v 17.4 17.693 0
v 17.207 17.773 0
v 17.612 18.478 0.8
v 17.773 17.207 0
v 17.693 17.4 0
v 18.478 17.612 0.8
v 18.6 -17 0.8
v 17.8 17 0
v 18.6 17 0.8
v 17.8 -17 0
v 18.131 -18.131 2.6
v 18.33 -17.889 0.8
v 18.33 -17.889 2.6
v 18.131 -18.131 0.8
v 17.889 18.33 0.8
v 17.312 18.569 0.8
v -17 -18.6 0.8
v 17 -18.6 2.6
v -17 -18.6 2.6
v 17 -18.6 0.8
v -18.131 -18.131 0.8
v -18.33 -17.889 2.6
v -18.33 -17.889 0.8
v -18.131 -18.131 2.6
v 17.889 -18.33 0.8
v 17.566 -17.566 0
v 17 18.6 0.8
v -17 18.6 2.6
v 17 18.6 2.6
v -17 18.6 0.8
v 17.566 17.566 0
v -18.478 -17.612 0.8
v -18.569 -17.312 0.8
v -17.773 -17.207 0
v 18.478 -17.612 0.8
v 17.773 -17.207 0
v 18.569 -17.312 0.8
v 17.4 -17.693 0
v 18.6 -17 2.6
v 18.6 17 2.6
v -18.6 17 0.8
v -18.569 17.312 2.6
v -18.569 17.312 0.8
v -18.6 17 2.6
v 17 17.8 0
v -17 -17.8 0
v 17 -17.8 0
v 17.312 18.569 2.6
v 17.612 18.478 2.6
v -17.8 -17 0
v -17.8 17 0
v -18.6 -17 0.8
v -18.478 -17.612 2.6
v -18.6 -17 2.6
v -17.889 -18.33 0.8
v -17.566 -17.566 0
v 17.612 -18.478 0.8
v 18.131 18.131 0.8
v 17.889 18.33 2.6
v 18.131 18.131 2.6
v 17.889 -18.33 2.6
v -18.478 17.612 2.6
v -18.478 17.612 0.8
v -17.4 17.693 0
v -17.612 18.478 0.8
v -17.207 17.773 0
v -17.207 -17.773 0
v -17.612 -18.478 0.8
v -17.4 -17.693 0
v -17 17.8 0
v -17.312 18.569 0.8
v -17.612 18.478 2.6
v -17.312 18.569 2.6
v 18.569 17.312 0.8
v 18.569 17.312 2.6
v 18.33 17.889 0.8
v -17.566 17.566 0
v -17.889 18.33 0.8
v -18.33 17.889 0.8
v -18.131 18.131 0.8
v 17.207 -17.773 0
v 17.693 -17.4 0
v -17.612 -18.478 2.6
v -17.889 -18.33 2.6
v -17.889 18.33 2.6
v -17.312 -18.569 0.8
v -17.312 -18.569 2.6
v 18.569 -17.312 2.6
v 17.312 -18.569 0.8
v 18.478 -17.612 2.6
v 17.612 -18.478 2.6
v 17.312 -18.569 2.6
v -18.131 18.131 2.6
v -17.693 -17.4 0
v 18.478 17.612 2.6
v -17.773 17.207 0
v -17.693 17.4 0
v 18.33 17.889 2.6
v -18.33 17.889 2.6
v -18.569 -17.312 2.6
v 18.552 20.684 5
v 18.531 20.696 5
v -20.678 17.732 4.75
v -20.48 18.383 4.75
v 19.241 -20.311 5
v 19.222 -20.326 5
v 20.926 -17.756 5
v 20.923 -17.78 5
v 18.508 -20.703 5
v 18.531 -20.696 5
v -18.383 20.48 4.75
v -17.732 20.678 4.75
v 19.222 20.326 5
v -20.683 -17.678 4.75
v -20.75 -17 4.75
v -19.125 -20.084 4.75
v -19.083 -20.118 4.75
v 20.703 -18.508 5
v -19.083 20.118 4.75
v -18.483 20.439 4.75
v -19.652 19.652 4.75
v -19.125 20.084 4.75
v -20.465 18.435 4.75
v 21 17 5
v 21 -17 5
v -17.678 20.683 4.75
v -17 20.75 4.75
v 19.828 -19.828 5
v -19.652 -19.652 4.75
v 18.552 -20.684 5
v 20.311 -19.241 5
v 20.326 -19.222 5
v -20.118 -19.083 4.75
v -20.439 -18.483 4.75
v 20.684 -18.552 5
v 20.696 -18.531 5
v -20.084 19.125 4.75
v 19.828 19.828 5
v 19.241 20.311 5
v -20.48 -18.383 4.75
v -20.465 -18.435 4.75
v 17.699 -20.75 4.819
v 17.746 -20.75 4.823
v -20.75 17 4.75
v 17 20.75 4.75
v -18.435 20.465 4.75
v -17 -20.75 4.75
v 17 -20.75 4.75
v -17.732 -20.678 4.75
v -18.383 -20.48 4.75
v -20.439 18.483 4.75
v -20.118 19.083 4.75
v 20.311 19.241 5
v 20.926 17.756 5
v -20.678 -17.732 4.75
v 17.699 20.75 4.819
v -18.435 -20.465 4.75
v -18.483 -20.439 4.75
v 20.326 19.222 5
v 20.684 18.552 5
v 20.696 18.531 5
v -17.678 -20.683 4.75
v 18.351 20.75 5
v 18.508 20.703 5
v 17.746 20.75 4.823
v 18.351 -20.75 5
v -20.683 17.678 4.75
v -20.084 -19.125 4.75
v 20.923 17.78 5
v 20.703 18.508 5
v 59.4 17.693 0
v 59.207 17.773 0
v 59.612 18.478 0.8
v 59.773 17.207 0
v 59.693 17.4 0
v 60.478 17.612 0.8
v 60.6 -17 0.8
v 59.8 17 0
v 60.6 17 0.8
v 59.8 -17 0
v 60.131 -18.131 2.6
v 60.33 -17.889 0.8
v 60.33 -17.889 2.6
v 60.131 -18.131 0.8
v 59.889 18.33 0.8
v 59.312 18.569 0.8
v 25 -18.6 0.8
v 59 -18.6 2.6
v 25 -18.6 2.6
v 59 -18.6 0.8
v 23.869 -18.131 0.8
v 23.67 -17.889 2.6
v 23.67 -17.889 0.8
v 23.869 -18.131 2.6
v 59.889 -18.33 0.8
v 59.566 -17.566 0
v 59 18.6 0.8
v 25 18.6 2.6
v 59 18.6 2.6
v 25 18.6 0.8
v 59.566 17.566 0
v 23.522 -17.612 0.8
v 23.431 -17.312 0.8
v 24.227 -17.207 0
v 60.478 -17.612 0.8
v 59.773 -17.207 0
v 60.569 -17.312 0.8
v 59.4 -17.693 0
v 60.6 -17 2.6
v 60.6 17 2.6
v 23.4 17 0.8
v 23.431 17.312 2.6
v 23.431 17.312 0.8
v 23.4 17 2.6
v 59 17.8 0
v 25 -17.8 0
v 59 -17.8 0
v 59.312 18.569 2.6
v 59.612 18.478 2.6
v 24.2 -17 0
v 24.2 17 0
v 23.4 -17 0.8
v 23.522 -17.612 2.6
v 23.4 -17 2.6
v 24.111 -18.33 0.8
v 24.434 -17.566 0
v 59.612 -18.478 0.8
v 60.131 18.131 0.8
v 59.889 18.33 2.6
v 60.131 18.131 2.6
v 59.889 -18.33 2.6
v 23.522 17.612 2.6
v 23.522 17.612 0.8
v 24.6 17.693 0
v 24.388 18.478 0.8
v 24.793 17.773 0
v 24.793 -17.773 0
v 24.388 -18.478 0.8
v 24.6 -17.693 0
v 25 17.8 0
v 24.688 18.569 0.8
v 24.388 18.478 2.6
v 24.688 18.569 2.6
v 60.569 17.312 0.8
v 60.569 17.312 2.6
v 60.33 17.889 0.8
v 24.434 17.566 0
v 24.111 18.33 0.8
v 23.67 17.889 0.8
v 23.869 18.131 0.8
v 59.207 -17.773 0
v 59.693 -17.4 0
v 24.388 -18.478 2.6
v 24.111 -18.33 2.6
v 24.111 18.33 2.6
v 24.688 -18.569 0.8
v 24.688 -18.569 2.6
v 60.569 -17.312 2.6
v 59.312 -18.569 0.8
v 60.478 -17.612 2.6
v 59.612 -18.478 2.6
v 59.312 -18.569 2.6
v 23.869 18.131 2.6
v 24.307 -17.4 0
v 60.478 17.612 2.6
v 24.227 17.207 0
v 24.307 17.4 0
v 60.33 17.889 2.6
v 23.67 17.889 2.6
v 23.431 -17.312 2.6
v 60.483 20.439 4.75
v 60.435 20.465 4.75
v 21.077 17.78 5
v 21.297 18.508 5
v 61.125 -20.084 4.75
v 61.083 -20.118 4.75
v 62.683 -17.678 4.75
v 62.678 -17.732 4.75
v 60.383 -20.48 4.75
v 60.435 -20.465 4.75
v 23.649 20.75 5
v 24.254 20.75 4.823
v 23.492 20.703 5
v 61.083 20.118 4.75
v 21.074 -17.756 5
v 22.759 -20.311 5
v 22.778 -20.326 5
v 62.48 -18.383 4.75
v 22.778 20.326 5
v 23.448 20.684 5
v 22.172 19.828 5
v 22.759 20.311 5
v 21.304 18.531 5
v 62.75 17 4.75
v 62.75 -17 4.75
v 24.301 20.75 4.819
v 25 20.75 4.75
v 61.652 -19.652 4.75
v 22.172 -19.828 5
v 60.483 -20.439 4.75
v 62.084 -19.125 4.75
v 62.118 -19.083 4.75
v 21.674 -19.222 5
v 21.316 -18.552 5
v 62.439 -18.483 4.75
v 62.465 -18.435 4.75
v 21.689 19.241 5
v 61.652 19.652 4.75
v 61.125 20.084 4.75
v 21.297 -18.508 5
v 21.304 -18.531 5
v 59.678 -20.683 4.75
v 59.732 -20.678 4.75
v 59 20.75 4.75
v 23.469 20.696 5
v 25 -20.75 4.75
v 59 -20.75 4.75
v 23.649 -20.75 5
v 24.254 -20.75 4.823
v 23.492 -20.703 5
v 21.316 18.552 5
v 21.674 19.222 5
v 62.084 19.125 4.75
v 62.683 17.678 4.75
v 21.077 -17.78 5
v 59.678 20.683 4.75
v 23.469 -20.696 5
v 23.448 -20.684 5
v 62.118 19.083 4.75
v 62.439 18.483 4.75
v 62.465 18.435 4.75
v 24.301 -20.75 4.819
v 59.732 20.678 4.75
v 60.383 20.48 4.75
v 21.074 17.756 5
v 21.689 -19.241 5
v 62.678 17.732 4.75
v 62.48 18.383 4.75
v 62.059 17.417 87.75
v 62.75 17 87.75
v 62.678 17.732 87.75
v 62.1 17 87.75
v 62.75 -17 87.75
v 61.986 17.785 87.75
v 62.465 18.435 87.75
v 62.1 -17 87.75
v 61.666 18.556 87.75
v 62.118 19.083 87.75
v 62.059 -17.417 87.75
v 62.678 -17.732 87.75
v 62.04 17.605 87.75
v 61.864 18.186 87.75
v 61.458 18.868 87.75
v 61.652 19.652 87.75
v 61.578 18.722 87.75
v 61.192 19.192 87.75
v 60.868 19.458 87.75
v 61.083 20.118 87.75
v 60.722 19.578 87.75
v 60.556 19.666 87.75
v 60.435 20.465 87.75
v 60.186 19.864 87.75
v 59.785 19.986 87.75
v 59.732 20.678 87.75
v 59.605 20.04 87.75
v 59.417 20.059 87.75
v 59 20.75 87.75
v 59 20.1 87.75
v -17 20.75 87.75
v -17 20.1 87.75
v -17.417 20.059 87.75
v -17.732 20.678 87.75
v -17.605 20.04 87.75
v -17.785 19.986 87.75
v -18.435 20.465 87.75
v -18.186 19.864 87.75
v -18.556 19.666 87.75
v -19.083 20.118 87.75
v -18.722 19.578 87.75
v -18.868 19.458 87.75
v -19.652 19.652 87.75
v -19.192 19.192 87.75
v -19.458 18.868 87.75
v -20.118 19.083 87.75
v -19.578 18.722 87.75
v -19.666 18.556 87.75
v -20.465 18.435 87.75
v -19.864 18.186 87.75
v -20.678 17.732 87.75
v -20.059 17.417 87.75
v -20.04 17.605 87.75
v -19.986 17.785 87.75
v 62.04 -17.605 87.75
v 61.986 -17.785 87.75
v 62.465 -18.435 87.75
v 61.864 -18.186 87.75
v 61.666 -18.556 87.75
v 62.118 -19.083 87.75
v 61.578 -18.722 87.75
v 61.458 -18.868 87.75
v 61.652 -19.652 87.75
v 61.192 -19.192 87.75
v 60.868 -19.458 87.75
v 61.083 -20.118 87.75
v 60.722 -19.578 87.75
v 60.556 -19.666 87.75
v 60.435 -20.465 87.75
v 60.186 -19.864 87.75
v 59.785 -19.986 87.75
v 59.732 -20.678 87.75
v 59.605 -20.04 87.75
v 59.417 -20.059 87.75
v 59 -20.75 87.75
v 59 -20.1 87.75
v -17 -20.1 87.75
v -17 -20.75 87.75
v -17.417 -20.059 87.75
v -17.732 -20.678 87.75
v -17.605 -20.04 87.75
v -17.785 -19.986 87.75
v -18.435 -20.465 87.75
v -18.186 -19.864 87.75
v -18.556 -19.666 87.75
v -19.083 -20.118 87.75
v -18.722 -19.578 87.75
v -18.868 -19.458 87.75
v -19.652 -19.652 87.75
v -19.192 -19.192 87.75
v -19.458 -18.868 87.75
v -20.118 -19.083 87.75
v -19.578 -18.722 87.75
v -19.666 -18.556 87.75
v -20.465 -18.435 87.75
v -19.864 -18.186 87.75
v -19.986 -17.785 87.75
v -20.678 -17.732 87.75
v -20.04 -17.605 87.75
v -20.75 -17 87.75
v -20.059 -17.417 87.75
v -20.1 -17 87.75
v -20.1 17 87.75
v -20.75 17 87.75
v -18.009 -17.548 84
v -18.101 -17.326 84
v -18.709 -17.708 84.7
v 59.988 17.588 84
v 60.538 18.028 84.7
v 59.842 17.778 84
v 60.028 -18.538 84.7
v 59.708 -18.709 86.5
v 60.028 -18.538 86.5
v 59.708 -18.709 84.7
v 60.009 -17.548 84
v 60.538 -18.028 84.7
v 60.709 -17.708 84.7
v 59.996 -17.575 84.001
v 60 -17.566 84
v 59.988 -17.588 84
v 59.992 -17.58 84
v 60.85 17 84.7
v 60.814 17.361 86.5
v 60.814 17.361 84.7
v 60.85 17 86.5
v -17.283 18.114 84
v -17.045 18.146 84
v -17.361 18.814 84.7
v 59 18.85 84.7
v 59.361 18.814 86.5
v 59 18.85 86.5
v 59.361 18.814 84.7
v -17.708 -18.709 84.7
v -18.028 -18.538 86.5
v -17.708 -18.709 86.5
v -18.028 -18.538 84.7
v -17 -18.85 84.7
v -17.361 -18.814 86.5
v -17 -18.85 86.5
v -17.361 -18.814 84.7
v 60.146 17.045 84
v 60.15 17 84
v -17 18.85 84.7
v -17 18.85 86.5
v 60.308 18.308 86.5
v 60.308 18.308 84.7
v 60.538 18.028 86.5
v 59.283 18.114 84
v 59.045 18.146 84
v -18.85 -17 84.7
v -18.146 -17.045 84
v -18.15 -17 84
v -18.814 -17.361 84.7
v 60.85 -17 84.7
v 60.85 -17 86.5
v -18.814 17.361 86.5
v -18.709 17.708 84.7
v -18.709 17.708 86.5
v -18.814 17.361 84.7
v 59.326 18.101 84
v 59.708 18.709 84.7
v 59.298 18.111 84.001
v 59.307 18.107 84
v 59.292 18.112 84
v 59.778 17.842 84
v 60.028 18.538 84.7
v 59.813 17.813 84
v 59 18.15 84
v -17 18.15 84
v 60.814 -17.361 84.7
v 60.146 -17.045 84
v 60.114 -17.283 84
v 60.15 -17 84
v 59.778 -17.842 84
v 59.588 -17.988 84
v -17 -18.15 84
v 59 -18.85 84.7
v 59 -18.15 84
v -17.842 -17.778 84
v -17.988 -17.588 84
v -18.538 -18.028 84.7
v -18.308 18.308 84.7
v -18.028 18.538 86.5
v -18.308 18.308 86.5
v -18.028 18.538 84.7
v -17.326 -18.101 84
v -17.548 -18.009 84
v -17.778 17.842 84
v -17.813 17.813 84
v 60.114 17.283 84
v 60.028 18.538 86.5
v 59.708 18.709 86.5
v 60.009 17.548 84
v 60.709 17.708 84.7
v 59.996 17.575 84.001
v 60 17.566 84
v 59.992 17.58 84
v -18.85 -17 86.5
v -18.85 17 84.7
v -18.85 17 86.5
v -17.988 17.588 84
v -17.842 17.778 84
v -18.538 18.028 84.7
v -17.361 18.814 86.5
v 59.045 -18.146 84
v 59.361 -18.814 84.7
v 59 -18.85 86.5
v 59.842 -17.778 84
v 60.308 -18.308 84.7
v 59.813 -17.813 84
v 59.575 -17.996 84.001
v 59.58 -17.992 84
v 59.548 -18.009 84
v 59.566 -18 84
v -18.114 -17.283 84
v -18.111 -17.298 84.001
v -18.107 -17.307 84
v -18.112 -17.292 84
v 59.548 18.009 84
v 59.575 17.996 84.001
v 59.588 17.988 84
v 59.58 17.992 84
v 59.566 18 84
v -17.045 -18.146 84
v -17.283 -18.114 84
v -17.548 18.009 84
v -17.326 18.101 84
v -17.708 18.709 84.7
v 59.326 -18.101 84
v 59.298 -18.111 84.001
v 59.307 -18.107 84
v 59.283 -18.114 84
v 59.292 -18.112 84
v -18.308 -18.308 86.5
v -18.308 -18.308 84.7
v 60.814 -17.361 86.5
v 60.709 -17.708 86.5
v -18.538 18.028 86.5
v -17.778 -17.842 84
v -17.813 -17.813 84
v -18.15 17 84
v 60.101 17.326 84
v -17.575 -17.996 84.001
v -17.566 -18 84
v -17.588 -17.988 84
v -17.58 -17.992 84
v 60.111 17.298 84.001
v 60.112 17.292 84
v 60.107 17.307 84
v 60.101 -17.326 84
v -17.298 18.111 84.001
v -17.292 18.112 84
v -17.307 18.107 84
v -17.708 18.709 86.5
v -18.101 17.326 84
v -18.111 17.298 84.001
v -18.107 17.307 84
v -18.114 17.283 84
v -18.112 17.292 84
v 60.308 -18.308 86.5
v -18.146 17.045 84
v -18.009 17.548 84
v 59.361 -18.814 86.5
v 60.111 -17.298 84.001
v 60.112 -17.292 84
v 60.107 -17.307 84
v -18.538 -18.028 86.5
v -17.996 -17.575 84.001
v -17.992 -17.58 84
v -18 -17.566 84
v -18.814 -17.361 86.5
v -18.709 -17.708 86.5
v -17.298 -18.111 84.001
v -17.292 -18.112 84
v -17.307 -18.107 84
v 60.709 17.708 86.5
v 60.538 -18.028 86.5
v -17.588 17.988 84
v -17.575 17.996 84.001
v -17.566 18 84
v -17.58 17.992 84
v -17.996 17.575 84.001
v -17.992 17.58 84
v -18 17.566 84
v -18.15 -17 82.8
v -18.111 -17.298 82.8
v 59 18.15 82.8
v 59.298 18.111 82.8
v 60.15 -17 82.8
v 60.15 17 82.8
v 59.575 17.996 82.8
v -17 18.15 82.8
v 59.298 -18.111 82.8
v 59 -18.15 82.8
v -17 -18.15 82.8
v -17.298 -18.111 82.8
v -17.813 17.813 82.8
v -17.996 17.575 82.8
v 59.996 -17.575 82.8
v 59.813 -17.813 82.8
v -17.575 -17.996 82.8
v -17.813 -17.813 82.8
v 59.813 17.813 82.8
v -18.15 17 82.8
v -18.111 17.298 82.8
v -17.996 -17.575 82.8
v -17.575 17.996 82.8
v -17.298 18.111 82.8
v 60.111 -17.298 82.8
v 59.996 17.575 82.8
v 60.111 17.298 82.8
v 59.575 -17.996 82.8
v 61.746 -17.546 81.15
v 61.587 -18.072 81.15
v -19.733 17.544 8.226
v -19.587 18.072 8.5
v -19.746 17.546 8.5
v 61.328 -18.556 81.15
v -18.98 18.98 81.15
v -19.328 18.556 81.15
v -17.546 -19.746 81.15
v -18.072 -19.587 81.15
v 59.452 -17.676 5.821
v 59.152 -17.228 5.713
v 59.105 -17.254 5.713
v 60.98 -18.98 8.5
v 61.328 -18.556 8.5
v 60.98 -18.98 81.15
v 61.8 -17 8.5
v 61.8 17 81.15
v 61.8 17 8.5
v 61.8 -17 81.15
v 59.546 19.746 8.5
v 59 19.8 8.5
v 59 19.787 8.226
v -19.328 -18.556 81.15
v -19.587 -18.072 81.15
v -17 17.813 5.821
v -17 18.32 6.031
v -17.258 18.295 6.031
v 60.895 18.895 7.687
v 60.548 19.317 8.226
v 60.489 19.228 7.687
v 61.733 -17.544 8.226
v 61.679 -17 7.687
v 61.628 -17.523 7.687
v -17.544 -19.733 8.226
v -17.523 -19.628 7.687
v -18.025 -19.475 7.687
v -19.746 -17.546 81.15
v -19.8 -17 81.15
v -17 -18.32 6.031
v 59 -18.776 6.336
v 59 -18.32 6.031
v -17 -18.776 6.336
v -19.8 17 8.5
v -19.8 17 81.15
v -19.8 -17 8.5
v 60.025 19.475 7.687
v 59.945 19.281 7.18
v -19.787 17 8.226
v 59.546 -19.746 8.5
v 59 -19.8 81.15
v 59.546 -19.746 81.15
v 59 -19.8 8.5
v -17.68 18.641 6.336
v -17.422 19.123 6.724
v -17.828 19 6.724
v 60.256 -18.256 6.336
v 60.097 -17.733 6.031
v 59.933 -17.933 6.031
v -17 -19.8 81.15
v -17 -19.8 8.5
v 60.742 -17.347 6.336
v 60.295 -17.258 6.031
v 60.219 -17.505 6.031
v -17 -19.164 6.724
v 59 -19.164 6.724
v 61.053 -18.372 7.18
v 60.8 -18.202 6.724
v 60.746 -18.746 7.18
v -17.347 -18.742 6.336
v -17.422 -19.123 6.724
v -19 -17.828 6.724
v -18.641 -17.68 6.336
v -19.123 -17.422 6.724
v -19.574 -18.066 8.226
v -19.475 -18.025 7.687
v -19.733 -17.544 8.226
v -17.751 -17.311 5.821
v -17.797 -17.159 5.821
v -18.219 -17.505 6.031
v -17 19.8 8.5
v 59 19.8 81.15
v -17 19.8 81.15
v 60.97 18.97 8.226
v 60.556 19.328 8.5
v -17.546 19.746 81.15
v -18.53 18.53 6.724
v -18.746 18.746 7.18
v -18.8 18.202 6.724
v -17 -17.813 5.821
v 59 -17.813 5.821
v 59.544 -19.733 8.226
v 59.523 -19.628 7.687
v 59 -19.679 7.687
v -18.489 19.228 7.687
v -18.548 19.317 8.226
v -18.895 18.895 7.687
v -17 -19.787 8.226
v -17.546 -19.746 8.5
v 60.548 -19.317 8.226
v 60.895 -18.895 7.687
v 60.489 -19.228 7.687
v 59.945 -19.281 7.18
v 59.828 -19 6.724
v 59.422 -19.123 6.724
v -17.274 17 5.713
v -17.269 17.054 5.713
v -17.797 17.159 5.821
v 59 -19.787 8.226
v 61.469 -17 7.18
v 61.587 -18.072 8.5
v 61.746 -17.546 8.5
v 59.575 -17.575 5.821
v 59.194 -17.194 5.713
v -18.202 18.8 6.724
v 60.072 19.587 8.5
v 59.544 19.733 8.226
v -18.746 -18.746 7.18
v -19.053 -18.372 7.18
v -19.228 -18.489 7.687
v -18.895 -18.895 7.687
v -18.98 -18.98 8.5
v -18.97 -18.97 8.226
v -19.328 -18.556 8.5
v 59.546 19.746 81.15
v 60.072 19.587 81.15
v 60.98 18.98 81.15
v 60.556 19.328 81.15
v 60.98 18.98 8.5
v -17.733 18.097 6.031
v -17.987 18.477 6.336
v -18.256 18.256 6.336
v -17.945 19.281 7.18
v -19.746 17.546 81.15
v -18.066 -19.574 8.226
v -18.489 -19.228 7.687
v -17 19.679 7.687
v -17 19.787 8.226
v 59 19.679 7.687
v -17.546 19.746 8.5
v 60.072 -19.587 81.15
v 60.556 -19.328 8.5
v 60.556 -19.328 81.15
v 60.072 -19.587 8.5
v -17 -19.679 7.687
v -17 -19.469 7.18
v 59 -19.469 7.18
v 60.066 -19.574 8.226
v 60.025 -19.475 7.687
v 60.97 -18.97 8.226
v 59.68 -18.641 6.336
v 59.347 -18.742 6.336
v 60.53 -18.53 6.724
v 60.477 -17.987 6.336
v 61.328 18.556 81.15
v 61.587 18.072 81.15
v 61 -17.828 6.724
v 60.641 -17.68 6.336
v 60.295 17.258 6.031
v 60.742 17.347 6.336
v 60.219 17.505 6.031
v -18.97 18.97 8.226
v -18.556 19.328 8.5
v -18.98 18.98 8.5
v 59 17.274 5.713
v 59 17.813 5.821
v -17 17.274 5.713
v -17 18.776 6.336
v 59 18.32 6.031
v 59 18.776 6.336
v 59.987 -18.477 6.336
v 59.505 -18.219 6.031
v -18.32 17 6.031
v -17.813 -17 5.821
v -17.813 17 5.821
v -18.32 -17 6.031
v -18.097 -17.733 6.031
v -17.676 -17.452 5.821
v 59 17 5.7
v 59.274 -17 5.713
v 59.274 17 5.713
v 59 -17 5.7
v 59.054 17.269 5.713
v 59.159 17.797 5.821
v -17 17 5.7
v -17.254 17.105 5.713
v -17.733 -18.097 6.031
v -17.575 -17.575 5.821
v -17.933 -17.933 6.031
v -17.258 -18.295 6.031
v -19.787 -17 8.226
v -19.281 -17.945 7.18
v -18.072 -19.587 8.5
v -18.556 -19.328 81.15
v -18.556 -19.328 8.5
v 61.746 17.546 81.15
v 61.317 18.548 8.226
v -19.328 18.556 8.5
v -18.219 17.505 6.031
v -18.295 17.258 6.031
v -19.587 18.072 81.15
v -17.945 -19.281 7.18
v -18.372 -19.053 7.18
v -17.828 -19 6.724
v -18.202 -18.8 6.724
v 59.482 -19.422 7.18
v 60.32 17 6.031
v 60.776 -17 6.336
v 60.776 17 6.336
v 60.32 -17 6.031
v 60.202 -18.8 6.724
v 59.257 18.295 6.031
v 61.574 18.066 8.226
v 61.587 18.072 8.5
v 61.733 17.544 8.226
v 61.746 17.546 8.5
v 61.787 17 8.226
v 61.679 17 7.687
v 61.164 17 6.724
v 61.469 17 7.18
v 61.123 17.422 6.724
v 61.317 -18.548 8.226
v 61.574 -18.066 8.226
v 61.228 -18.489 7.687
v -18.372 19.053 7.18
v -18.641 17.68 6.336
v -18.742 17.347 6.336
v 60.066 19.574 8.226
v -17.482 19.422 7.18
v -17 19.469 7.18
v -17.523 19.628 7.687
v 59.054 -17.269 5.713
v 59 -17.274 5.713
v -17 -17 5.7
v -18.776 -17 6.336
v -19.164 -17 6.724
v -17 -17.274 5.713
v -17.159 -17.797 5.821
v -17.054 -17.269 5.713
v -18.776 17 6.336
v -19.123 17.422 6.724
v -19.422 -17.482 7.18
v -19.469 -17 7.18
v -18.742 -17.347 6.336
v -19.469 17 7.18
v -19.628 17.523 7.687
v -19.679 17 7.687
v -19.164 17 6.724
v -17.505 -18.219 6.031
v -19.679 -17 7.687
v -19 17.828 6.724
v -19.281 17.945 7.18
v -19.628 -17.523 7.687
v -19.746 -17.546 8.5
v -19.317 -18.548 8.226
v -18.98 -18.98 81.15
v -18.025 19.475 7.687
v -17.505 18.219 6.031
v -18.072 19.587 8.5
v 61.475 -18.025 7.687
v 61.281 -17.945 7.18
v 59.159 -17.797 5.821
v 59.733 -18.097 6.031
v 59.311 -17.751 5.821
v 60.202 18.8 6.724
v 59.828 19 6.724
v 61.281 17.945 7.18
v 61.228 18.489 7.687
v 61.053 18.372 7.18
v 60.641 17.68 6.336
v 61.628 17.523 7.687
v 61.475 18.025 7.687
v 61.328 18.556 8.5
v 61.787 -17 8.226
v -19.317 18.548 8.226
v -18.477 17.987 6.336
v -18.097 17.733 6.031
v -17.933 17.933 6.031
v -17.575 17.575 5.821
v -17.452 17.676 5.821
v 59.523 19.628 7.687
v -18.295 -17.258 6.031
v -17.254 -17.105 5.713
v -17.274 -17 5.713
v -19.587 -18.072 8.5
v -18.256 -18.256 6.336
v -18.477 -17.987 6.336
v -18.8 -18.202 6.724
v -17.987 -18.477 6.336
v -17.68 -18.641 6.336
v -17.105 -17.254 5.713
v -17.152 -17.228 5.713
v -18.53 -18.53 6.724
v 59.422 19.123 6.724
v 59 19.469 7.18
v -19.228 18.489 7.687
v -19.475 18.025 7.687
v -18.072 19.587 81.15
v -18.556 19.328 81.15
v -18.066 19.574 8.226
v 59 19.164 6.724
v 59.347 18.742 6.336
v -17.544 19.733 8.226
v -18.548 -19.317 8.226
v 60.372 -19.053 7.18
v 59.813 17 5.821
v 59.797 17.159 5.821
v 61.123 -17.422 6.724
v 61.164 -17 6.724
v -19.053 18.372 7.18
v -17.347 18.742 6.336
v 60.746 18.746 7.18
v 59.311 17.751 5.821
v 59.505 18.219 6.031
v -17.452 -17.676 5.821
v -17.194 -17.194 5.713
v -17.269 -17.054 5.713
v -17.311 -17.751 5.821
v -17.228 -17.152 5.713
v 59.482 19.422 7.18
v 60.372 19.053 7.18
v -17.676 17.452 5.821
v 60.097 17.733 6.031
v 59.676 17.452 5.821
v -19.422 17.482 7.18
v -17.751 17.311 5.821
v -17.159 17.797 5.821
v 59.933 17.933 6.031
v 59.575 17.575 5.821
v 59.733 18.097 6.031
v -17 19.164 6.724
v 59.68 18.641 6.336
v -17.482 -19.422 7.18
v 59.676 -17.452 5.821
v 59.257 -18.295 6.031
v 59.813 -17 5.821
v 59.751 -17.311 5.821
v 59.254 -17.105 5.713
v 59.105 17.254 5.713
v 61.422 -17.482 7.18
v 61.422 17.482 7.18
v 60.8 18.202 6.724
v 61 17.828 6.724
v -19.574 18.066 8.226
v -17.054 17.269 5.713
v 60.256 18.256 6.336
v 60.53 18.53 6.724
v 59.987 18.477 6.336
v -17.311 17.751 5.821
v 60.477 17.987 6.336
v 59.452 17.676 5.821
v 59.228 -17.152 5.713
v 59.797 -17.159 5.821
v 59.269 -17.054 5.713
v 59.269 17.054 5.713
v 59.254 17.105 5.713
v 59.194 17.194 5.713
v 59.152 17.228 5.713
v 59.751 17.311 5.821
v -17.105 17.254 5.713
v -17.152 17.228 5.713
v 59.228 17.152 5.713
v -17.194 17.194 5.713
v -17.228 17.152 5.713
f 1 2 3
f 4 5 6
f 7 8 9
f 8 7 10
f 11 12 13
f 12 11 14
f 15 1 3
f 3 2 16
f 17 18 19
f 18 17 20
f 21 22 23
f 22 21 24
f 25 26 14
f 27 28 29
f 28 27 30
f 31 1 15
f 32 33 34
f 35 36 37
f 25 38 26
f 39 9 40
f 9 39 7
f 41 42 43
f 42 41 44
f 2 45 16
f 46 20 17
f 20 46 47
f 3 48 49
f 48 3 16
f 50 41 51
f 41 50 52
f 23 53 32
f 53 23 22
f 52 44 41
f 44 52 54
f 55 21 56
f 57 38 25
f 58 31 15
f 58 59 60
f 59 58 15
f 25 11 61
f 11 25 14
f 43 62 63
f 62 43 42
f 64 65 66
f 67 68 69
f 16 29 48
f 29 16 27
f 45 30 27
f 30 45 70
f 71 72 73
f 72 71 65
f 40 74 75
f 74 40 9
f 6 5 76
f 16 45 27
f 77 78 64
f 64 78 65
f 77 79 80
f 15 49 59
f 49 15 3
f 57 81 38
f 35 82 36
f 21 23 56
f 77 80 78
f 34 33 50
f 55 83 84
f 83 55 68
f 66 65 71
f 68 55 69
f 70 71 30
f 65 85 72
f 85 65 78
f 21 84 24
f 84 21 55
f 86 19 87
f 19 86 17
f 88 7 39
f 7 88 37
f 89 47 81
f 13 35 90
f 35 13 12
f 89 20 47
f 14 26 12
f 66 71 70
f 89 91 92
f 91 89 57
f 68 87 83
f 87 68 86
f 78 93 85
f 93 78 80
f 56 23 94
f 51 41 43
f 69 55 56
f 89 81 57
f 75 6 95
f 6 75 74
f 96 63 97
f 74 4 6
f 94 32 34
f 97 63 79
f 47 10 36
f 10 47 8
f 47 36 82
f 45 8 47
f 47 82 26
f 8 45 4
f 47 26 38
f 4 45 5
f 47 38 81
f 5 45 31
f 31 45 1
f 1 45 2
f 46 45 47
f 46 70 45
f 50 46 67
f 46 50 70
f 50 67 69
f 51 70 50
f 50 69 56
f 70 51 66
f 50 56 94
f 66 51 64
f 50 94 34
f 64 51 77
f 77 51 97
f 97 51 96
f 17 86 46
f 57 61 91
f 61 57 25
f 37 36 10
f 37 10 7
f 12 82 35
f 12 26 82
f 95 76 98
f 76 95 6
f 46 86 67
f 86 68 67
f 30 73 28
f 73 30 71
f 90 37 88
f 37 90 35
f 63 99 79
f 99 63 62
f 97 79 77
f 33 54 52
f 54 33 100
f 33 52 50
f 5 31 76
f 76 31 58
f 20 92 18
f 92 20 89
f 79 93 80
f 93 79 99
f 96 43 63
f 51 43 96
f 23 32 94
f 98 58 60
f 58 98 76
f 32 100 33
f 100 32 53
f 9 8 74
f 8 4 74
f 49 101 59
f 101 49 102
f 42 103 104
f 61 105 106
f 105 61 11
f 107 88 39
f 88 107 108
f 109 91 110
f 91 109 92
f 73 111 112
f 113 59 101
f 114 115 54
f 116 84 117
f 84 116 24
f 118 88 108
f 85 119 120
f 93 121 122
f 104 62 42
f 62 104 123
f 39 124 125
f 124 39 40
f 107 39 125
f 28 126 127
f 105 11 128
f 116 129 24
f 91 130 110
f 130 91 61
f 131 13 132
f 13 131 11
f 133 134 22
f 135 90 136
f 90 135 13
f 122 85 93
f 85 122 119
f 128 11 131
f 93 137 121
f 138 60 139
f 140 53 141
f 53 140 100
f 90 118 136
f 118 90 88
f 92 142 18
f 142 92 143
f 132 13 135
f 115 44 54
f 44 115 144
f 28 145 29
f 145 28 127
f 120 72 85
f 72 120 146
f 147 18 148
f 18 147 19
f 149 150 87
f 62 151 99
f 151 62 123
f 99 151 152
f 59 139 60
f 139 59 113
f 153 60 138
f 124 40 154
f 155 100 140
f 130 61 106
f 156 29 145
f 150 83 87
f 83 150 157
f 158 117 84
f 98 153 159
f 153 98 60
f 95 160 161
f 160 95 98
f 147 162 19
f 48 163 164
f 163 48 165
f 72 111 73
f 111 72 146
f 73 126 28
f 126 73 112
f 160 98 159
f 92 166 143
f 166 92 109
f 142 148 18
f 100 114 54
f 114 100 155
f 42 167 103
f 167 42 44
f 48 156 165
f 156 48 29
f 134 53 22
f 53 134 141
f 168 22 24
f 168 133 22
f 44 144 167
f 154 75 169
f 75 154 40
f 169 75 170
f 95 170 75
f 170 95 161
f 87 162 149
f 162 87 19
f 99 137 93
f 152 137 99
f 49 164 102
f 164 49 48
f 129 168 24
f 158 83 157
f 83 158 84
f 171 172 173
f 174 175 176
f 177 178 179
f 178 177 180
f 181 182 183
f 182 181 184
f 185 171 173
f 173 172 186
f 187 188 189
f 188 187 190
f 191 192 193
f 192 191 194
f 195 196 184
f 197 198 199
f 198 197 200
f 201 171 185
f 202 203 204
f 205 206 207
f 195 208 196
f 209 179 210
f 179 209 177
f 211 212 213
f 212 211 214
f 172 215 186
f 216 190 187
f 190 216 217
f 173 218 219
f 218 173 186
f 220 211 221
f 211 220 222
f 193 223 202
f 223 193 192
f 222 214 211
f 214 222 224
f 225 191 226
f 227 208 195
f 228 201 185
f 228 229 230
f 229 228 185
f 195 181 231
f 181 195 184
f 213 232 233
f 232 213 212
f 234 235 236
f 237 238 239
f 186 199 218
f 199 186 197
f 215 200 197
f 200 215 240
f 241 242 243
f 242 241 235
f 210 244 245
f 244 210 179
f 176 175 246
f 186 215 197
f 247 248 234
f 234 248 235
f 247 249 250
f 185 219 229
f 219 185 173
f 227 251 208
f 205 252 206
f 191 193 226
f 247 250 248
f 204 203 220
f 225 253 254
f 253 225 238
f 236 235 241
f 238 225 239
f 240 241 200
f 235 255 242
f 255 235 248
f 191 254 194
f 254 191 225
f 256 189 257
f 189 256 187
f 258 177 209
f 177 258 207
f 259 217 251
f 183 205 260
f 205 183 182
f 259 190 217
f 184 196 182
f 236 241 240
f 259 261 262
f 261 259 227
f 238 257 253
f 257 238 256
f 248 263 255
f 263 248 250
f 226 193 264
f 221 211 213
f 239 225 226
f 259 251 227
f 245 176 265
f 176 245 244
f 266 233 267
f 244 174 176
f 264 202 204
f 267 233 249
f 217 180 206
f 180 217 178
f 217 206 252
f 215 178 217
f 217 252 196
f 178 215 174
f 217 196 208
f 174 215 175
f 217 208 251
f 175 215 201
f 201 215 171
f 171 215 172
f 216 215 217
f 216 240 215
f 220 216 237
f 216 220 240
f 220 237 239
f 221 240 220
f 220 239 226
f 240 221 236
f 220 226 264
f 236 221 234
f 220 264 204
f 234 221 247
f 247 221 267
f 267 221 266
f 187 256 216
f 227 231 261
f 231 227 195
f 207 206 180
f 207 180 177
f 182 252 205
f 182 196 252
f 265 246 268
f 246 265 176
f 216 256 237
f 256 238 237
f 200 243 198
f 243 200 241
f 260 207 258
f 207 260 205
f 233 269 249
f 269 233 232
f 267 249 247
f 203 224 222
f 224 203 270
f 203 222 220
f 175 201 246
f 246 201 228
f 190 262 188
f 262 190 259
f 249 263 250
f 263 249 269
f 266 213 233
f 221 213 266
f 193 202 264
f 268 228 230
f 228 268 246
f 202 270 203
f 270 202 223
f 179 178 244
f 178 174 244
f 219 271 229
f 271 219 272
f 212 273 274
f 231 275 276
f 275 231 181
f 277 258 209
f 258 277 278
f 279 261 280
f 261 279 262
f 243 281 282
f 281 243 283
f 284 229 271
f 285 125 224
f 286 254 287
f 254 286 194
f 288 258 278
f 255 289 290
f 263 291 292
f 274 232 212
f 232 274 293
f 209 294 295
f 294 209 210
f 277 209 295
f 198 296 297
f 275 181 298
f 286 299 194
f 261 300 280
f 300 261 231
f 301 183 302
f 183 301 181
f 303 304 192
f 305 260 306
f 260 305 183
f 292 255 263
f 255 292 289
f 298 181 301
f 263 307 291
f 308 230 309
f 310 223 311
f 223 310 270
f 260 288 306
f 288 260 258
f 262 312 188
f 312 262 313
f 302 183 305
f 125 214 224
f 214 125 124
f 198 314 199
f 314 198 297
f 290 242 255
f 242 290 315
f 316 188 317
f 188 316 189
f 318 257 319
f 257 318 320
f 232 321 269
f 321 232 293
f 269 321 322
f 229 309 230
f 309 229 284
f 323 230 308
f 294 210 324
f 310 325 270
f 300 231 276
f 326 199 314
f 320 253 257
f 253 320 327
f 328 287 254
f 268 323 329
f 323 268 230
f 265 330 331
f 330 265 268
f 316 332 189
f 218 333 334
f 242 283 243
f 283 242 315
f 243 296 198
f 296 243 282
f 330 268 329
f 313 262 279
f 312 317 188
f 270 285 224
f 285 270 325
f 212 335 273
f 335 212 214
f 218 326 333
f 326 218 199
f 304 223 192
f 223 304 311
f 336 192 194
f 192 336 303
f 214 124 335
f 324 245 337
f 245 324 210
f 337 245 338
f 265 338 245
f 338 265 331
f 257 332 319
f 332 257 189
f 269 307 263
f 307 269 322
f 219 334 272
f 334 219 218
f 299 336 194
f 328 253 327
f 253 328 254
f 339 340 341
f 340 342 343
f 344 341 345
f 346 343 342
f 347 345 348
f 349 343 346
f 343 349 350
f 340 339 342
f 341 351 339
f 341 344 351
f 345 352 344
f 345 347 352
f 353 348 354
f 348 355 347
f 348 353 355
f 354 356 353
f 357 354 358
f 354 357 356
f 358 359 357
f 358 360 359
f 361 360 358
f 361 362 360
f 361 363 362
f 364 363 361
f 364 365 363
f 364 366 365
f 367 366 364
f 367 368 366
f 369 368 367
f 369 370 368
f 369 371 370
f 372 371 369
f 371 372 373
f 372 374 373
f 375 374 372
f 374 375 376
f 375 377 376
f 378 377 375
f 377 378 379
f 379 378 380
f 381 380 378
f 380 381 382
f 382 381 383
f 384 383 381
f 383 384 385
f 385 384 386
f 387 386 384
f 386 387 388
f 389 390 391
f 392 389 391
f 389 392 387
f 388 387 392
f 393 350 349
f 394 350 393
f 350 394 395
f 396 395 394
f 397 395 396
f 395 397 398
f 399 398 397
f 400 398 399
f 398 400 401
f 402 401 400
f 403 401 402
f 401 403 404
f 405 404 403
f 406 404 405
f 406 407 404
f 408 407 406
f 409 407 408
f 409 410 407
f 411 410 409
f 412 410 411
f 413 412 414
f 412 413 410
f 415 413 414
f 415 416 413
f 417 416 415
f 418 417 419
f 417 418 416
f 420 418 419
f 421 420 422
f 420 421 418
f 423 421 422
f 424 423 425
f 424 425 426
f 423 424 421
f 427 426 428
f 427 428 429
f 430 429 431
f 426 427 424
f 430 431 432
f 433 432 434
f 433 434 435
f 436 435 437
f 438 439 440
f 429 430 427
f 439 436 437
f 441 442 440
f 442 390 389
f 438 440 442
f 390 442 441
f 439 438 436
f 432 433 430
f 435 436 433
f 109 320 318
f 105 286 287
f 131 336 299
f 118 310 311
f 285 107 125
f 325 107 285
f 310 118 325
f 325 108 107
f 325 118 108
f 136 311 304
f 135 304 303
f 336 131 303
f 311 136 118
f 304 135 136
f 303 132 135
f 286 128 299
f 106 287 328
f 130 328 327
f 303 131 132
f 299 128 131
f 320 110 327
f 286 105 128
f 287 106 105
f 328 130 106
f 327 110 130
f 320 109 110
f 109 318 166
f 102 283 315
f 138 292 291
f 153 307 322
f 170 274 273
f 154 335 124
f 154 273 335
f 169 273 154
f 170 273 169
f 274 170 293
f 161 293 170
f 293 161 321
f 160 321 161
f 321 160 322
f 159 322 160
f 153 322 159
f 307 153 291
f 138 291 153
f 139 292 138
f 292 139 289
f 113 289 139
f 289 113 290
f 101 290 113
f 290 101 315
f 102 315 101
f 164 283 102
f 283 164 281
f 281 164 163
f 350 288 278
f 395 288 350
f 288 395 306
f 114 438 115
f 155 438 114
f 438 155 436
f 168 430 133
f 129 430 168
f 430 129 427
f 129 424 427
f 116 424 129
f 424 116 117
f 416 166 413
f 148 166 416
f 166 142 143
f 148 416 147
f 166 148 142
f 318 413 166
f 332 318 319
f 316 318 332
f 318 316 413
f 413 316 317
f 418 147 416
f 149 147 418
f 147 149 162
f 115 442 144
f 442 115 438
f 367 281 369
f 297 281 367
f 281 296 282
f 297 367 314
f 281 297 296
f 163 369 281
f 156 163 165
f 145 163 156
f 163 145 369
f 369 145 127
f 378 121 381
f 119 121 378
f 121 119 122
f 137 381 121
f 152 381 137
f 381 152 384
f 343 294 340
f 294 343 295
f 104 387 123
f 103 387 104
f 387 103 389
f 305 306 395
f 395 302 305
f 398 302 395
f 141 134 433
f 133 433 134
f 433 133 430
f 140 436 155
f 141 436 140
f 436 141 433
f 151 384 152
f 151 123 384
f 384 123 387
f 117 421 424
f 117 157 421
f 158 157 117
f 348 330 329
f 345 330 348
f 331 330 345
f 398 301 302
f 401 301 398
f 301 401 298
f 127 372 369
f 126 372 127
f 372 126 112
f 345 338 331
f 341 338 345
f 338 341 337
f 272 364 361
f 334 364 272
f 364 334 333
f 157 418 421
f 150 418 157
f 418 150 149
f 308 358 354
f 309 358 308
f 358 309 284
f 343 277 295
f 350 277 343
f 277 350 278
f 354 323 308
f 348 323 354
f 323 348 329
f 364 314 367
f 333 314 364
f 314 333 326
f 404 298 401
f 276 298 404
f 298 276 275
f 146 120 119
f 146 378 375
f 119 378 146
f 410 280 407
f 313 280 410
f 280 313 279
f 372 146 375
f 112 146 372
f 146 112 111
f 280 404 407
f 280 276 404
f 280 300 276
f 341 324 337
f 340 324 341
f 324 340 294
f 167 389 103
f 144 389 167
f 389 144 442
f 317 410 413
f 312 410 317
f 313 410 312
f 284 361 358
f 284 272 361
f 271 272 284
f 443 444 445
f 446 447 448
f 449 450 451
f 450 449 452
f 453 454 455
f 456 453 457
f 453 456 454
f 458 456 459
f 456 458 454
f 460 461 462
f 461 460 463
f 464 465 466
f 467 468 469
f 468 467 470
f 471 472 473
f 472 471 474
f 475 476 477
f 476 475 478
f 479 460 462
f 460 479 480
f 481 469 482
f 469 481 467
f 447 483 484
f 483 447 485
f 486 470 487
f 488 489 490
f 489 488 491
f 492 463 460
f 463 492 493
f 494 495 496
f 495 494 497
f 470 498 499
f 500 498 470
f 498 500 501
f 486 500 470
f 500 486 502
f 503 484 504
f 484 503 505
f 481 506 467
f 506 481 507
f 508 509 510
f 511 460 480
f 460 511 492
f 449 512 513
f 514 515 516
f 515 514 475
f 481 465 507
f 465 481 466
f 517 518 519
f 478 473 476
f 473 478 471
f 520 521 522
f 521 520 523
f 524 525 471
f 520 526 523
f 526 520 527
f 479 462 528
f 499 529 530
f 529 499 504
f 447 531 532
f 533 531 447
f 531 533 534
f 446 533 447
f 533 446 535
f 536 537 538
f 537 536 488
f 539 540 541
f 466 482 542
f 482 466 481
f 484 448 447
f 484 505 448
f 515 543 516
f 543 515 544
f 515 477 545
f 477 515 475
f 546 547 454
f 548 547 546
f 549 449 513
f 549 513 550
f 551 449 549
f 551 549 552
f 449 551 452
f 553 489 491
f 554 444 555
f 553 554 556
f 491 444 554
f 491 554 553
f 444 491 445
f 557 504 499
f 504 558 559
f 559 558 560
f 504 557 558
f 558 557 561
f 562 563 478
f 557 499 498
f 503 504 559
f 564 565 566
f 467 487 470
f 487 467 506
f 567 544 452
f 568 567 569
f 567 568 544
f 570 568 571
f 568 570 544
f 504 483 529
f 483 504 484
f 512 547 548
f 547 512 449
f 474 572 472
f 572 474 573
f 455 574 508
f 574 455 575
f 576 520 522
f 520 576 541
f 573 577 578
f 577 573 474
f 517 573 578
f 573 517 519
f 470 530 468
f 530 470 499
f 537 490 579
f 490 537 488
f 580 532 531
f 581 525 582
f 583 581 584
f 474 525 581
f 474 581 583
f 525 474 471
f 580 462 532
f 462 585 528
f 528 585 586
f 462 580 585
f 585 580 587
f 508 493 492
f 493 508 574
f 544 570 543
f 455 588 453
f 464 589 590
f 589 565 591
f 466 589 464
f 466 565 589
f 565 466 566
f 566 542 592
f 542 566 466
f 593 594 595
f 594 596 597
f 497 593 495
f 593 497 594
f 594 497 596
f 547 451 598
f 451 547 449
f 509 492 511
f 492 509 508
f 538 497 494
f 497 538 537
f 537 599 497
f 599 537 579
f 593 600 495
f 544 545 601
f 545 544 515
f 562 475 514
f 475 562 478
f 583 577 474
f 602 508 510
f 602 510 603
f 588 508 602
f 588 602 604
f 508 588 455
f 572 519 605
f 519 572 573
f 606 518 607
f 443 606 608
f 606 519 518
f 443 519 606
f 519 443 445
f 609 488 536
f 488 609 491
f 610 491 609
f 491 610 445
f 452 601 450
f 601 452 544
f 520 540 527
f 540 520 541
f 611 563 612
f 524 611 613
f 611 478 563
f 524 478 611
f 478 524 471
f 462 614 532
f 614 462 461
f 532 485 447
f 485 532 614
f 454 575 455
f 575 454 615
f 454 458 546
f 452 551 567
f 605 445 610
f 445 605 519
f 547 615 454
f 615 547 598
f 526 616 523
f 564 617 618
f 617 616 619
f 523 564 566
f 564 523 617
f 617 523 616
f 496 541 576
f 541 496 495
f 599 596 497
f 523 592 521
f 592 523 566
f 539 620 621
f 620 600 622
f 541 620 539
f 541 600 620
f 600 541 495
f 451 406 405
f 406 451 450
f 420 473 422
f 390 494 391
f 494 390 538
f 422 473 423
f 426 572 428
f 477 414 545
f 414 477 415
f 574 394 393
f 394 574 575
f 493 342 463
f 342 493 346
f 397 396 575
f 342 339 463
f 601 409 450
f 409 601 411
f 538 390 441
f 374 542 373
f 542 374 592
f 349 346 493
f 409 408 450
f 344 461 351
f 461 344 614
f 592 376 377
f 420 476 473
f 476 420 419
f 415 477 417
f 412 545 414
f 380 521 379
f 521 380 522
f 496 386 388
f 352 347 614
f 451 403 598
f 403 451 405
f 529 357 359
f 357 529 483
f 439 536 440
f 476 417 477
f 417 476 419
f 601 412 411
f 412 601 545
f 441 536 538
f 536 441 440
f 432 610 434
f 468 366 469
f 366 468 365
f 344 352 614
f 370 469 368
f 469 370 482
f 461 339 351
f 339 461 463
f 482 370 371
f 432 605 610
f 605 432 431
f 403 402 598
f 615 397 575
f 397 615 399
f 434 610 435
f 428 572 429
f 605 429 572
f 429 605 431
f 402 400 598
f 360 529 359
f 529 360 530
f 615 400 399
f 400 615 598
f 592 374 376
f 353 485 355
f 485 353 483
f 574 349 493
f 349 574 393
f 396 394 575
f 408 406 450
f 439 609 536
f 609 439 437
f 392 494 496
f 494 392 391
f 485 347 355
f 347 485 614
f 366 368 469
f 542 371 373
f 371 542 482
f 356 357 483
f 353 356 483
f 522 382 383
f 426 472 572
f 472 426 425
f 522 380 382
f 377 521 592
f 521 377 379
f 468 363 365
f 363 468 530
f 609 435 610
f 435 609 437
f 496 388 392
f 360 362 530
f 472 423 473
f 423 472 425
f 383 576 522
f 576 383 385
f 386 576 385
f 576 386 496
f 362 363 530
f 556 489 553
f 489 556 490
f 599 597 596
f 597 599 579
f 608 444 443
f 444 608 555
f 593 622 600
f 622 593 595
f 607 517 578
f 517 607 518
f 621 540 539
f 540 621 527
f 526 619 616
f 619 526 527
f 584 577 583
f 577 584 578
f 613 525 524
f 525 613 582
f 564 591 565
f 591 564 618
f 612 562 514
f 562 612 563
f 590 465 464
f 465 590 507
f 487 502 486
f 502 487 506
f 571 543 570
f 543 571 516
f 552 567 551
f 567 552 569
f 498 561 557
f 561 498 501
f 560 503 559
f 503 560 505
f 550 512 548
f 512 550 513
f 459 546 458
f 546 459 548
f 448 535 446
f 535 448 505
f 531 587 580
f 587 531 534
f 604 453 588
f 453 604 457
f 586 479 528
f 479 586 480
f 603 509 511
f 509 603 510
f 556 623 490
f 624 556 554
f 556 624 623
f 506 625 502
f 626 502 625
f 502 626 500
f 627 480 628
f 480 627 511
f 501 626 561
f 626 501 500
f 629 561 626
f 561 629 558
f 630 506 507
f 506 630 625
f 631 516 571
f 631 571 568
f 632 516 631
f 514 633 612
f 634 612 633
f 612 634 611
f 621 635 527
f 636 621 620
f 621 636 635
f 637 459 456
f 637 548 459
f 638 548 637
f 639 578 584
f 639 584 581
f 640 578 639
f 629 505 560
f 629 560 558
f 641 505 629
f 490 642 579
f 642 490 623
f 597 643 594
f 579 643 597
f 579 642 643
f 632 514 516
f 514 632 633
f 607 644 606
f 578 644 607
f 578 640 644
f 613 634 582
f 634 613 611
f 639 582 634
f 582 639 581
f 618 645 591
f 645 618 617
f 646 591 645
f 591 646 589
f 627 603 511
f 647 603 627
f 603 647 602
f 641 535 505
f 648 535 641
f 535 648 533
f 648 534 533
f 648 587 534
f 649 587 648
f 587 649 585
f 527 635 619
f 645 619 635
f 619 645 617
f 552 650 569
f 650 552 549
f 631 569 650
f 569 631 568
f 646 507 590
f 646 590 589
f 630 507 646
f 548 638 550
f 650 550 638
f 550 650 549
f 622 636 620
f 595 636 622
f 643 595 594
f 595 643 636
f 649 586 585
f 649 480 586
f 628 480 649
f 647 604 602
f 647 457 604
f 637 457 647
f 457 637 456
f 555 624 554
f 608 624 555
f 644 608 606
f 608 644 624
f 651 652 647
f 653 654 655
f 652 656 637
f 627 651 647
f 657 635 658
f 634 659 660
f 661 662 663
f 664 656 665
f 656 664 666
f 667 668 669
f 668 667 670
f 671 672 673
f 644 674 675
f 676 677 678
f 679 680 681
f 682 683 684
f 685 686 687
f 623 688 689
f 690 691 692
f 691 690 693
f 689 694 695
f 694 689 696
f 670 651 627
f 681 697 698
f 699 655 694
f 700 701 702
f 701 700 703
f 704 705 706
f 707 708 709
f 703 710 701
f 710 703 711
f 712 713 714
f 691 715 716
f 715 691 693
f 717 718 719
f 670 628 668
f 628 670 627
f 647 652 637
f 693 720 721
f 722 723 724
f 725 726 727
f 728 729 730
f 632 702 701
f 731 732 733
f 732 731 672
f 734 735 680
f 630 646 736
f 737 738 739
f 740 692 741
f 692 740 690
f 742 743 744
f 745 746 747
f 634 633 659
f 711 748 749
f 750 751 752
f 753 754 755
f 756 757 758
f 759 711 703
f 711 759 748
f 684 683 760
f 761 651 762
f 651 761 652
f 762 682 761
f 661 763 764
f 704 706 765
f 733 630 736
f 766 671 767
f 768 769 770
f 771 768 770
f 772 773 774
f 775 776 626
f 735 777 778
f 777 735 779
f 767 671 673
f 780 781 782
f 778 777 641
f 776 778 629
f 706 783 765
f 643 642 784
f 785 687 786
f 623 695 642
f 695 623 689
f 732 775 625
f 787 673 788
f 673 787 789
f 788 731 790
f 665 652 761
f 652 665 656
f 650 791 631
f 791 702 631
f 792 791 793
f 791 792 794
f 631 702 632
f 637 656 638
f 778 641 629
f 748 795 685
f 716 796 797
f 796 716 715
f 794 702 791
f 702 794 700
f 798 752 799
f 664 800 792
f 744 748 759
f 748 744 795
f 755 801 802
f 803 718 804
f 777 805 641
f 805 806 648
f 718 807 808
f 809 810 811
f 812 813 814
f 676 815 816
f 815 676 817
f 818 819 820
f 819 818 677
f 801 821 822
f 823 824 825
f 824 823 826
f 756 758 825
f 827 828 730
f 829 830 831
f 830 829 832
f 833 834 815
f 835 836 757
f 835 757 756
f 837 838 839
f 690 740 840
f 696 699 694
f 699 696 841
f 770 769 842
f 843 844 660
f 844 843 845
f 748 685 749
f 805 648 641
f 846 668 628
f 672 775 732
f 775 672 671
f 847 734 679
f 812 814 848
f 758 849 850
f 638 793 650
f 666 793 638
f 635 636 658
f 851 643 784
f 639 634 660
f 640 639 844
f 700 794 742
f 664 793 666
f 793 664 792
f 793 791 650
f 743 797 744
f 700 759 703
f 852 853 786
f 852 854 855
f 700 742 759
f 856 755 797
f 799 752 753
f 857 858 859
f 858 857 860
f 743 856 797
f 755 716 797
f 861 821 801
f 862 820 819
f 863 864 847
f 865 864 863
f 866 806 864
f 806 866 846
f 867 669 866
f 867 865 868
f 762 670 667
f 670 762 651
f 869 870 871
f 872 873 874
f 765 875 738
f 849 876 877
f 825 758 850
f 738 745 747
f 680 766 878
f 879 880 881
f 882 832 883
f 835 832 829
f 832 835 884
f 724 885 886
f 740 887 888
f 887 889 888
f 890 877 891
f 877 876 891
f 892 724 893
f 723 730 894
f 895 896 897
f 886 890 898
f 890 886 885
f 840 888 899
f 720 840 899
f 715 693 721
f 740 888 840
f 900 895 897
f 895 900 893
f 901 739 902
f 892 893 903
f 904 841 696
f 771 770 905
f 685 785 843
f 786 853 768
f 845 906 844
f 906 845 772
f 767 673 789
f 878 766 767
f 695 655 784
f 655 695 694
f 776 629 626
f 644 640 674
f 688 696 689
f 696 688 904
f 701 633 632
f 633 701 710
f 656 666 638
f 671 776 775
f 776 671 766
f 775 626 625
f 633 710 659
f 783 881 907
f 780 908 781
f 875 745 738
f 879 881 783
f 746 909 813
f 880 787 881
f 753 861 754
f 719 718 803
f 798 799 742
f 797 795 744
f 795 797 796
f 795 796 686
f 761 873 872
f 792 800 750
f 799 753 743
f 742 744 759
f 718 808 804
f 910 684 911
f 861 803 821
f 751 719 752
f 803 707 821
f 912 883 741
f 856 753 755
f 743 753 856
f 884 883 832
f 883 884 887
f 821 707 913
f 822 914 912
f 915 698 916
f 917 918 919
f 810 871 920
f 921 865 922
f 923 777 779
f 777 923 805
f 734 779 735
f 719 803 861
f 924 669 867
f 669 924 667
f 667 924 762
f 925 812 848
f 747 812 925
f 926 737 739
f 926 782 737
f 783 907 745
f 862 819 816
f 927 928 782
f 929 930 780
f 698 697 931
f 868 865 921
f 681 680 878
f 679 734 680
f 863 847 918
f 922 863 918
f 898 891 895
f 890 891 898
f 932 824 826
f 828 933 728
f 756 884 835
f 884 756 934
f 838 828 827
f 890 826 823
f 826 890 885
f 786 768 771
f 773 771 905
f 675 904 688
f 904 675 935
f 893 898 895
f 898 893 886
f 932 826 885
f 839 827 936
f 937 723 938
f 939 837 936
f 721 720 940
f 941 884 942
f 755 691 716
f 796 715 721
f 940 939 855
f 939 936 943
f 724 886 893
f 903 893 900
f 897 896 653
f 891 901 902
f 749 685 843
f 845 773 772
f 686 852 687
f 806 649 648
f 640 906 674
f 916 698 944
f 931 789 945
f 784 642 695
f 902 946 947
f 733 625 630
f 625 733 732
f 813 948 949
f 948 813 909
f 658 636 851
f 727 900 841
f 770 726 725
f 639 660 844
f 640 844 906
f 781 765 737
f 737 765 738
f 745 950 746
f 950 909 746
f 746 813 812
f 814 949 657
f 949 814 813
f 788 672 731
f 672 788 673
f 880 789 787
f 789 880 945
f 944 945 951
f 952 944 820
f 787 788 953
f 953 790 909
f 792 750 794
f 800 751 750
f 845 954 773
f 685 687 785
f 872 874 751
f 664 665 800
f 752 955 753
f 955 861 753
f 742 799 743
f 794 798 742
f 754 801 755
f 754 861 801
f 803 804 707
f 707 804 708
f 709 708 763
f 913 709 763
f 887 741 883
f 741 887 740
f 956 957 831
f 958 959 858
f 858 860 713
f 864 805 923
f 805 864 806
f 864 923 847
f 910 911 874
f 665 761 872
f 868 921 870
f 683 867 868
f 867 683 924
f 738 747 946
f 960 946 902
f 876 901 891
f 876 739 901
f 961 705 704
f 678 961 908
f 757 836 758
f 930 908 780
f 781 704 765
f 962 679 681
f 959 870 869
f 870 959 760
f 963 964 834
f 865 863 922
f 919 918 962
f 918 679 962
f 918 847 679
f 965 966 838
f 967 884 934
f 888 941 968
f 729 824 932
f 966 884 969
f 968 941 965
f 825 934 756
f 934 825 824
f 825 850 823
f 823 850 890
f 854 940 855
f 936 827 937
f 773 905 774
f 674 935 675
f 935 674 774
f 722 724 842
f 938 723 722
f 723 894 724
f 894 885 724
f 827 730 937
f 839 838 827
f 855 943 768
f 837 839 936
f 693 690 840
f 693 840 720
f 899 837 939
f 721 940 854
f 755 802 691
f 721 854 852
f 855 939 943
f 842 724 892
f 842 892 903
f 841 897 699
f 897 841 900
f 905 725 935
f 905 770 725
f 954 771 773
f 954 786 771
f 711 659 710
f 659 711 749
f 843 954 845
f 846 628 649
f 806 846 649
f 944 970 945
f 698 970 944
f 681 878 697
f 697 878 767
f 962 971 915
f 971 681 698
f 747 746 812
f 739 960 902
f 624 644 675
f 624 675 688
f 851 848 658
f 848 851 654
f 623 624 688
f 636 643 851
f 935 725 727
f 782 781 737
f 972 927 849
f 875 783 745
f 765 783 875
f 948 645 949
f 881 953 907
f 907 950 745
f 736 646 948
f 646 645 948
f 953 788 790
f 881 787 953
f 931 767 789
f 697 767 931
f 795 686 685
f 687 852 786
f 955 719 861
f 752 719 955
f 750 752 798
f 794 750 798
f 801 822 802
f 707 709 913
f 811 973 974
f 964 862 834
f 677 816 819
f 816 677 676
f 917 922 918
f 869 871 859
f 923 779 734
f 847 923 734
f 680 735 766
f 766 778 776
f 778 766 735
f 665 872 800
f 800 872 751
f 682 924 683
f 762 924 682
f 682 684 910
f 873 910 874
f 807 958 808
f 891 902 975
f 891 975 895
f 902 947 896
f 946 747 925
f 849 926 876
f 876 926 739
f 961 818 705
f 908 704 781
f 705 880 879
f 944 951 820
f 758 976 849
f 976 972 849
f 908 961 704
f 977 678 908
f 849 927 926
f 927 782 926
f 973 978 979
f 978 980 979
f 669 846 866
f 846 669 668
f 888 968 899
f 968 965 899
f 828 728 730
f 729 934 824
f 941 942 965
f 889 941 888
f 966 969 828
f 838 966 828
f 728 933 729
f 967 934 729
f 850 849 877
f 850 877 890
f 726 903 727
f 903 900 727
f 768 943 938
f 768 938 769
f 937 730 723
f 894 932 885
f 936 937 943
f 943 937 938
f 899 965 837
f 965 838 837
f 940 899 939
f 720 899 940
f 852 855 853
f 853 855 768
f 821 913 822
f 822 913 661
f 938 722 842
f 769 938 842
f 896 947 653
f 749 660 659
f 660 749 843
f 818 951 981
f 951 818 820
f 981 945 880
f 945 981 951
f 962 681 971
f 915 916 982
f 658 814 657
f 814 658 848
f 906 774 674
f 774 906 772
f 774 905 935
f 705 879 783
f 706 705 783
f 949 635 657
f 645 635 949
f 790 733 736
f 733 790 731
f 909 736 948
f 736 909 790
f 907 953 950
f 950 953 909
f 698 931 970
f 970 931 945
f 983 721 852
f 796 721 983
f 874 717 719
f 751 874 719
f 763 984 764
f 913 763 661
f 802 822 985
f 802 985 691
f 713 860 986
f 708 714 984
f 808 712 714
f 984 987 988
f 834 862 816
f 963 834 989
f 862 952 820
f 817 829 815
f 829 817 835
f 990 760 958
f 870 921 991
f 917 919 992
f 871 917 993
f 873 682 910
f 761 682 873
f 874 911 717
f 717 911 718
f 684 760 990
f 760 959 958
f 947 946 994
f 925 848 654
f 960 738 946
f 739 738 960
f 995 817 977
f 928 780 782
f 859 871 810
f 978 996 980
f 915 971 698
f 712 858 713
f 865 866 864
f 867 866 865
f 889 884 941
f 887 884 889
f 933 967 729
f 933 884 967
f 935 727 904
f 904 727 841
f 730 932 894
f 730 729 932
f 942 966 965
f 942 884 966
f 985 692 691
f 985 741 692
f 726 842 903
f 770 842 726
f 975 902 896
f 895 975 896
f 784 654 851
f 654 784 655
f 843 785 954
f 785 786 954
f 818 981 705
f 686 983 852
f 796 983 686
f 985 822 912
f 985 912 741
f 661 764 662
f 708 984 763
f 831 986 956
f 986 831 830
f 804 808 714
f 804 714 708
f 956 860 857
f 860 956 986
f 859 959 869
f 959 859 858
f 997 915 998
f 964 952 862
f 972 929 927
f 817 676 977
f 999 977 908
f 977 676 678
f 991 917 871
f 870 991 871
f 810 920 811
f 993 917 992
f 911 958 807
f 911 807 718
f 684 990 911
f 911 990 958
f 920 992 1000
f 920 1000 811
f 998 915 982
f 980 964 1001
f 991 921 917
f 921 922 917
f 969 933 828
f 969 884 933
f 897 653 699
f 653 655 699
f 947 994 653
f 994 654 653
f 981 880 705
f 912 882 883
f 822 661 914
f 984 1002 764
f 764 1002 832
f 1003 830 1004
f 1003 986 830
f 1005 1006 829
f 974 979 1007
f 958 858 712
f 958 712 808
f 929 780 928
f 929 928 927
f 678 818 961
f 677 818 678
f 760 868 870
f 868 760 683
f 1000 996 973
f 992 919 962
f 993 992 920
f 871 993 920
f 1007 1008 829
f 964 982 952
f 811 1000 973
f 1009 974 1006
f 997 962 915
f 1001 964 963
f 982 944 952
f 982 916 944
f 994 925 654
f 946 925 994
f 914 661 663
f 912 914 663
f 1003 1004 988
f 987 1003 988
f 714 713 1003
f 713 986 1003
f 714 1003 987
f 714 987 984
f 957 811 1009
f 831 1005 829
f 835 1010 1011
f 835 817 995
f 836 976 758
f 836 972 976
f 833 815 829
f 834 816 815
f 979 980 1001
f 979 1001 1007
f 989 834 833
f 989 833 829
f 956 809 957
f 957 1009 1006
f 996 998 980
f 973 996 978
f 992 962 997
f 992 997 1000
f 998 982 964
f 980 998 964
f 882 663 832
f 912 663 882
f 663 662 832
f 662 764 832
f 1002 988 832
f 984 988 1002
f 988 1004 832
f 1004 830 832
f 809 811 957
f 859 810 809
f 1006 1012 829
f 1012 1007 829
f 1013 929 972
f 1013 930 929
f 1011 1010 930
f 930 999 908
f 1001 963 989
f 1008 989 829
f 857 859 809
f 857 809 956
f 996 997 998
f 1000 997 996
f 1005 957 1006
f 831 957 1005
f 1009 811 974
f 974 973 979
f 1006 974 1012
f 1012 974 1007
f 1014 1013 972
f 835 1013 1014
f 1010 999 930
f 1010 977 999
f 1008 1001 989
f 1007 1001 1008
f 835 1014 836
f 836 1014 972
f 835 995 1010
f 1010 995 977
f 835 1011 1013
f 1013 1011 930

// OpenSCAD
// Note 1.
/* [Assembly display] */
// Note 2.
view = "default"; // [default, together, exploded]

use <gridfinity_cup_modules.scad>

// Note 3.
width = 2; // [ 0.5, 1, 2, 3, 4, 5, 6, 7, 8, 9, 10, 11, 12, 13 ]
// Note 4.
depth = 1; // [ 1, 2, 3, 4, 5, 6, 7, 8, 9, 10, 11, 12, 13 ]
// Note 5.
height = 12;
// Note 6.
magnet_diameter = 0;  // .1
// Note 7.
screw_depth = 0;
// Note 8.
hole_overhang_remedy = true;
// Note 9.
box_corner_attachments_only = false;
// Note 10.
filled_in = false;
// Note 11.
chambers = 1;
// Note 12.
withLabel = "disabled"; // ["disabled", "left", "right", "center", "leftchamber", "rightchamber", "centerchamber"]
// Note 13.
fingerslide = false;
// Note 14.
labelWidth = 0;  // .01
// Note 15.
floor_thickness = 0.7;
// Note 16.
wall_thickness = 0.95;  // .01
// Note 17.
efficient_floor = false;
// Note 18.
irregular_subdivisions = false;
// Note 19.
half_pitch = false;
// Note 20.
lip_style = "normal";  // [ "normal", "reduced", "none" ]

module end_of_customizer_opts() {}

// Note 21.
separator_positions = [ 0.25, 0.5, 1.4 ];

// Note 22.

module feral_default_output_ff9cebfaefbb() {
if (filled_in) {
  grid_block(width, depth, height, magnet_diameter=magnet_diameter,
    screw_depth=screw_depth, hole_overhang_remedy=hole_overhang_remedy,
    half_pitch=half_pitch, box_corner_attachments_only=box_corner_attachments_only);
}
else if (irregular_subdivisions) {
  irregular_cup(
    num_x=width,
    num_y=depth,
    num_z=height,
    withLabel=withLabel,
    labelWidth=labelWidth,
    fingerslide=fingerslide,
    magnet_diameter=magnet_diameter,
    screw_depth=screw_depth,
    floor_thickness=floor_thickness,
    wall_thickness=wall_thickness,
    hole_overhang_remedy=hole_overhang_remedy,
    separator_positions=separator_positions,
    half_pitch=half_pitch,
    lip_style=lip_style,
    box_corner_attachments_only=box_corner_attachments_only
  );
}
else {
  basic_cup(
    num_x=width,
    num_y=depth,
    num_z=height,
    chambers=chambers,
    withLabel=withLabel,
    labelWidth=labelWidth,
    fingerslide=fingerslide,
    magnet_diameter=magnet_diameter,
    screw_depth=screw_depth,
    floor_thickness=floor_thickness,
    wall_thickness=wall_thickness,
    hole_overhang_remedy=hole_overhang_remedy,
    efficient_floor=efficient_floor,
    half_pitch=half_pitch,
    lip_style=lip_style,
    box_corner_attachments_only=box_corner_attachments_only
  );
}
}

module feral_assembly_view_ff9cebfaefbb(explode=false) {
feral_default_output_ff9cebfaefbb();
}

assert(view == "default" || view == "together" || view == "exploded", "Unknown assembly display");
if(view == "default") feral_default_output_ff9cebfaefbb();
else feral_assembly_view_ff9cebfaefbb(view == "exploded");

// Notes

// Note 1. include <gridfinity_modules.scad>

// Note 2. default preserves the original part, coupon and print selectors.

// Note 3. X dimension in grid units

// Note 4. Y dimension in grid units

// Note 5. Z dimension (multiples of 7mm)

// Note 6. (Zack's design uses magnet diameter of 6.5)

// Note 7. (Zack's design uses depth of 6)

// Note 8. Hole overhang remedy is active only when both screws and magnets are nonzero (and this option is selected)

// Note 9. Only add attachments (magnets and screw) to box corners (prints faster).

// Note 10. Fill in solid block (overrides all following options)

// Note 11. X dimension subdivisions

// Note 12. Include overhang for labeling (and specify left/right/center justification)

// Note 13. Include larger corner fillet

// Note 14. Width of the label in number of units, or zero means full width

// Note 15. Minimum thickness above cutouts in base (Zack's design is effectively 1.2)

// Note 16. Wall thickness (Zack's design is 0.95)

// Note 17. Efficient floor option saves material and time, but the floor is not smooth (only applies if no magnets, screws, or finger-slide used)

// Note 18. When enabled, irregular subdivisions have to be defined in code

// Note 19. Enable to subdivide bottom pads to allow half-cell offsets

// Note 20. Remove some or all of lip

// Note 21. Separator positions are defined in terms of grid units from the left end

// Note 22. Assembly display changes placement only; the original output remains the default.
// Single printed piece: both display modes show the same intact part.
